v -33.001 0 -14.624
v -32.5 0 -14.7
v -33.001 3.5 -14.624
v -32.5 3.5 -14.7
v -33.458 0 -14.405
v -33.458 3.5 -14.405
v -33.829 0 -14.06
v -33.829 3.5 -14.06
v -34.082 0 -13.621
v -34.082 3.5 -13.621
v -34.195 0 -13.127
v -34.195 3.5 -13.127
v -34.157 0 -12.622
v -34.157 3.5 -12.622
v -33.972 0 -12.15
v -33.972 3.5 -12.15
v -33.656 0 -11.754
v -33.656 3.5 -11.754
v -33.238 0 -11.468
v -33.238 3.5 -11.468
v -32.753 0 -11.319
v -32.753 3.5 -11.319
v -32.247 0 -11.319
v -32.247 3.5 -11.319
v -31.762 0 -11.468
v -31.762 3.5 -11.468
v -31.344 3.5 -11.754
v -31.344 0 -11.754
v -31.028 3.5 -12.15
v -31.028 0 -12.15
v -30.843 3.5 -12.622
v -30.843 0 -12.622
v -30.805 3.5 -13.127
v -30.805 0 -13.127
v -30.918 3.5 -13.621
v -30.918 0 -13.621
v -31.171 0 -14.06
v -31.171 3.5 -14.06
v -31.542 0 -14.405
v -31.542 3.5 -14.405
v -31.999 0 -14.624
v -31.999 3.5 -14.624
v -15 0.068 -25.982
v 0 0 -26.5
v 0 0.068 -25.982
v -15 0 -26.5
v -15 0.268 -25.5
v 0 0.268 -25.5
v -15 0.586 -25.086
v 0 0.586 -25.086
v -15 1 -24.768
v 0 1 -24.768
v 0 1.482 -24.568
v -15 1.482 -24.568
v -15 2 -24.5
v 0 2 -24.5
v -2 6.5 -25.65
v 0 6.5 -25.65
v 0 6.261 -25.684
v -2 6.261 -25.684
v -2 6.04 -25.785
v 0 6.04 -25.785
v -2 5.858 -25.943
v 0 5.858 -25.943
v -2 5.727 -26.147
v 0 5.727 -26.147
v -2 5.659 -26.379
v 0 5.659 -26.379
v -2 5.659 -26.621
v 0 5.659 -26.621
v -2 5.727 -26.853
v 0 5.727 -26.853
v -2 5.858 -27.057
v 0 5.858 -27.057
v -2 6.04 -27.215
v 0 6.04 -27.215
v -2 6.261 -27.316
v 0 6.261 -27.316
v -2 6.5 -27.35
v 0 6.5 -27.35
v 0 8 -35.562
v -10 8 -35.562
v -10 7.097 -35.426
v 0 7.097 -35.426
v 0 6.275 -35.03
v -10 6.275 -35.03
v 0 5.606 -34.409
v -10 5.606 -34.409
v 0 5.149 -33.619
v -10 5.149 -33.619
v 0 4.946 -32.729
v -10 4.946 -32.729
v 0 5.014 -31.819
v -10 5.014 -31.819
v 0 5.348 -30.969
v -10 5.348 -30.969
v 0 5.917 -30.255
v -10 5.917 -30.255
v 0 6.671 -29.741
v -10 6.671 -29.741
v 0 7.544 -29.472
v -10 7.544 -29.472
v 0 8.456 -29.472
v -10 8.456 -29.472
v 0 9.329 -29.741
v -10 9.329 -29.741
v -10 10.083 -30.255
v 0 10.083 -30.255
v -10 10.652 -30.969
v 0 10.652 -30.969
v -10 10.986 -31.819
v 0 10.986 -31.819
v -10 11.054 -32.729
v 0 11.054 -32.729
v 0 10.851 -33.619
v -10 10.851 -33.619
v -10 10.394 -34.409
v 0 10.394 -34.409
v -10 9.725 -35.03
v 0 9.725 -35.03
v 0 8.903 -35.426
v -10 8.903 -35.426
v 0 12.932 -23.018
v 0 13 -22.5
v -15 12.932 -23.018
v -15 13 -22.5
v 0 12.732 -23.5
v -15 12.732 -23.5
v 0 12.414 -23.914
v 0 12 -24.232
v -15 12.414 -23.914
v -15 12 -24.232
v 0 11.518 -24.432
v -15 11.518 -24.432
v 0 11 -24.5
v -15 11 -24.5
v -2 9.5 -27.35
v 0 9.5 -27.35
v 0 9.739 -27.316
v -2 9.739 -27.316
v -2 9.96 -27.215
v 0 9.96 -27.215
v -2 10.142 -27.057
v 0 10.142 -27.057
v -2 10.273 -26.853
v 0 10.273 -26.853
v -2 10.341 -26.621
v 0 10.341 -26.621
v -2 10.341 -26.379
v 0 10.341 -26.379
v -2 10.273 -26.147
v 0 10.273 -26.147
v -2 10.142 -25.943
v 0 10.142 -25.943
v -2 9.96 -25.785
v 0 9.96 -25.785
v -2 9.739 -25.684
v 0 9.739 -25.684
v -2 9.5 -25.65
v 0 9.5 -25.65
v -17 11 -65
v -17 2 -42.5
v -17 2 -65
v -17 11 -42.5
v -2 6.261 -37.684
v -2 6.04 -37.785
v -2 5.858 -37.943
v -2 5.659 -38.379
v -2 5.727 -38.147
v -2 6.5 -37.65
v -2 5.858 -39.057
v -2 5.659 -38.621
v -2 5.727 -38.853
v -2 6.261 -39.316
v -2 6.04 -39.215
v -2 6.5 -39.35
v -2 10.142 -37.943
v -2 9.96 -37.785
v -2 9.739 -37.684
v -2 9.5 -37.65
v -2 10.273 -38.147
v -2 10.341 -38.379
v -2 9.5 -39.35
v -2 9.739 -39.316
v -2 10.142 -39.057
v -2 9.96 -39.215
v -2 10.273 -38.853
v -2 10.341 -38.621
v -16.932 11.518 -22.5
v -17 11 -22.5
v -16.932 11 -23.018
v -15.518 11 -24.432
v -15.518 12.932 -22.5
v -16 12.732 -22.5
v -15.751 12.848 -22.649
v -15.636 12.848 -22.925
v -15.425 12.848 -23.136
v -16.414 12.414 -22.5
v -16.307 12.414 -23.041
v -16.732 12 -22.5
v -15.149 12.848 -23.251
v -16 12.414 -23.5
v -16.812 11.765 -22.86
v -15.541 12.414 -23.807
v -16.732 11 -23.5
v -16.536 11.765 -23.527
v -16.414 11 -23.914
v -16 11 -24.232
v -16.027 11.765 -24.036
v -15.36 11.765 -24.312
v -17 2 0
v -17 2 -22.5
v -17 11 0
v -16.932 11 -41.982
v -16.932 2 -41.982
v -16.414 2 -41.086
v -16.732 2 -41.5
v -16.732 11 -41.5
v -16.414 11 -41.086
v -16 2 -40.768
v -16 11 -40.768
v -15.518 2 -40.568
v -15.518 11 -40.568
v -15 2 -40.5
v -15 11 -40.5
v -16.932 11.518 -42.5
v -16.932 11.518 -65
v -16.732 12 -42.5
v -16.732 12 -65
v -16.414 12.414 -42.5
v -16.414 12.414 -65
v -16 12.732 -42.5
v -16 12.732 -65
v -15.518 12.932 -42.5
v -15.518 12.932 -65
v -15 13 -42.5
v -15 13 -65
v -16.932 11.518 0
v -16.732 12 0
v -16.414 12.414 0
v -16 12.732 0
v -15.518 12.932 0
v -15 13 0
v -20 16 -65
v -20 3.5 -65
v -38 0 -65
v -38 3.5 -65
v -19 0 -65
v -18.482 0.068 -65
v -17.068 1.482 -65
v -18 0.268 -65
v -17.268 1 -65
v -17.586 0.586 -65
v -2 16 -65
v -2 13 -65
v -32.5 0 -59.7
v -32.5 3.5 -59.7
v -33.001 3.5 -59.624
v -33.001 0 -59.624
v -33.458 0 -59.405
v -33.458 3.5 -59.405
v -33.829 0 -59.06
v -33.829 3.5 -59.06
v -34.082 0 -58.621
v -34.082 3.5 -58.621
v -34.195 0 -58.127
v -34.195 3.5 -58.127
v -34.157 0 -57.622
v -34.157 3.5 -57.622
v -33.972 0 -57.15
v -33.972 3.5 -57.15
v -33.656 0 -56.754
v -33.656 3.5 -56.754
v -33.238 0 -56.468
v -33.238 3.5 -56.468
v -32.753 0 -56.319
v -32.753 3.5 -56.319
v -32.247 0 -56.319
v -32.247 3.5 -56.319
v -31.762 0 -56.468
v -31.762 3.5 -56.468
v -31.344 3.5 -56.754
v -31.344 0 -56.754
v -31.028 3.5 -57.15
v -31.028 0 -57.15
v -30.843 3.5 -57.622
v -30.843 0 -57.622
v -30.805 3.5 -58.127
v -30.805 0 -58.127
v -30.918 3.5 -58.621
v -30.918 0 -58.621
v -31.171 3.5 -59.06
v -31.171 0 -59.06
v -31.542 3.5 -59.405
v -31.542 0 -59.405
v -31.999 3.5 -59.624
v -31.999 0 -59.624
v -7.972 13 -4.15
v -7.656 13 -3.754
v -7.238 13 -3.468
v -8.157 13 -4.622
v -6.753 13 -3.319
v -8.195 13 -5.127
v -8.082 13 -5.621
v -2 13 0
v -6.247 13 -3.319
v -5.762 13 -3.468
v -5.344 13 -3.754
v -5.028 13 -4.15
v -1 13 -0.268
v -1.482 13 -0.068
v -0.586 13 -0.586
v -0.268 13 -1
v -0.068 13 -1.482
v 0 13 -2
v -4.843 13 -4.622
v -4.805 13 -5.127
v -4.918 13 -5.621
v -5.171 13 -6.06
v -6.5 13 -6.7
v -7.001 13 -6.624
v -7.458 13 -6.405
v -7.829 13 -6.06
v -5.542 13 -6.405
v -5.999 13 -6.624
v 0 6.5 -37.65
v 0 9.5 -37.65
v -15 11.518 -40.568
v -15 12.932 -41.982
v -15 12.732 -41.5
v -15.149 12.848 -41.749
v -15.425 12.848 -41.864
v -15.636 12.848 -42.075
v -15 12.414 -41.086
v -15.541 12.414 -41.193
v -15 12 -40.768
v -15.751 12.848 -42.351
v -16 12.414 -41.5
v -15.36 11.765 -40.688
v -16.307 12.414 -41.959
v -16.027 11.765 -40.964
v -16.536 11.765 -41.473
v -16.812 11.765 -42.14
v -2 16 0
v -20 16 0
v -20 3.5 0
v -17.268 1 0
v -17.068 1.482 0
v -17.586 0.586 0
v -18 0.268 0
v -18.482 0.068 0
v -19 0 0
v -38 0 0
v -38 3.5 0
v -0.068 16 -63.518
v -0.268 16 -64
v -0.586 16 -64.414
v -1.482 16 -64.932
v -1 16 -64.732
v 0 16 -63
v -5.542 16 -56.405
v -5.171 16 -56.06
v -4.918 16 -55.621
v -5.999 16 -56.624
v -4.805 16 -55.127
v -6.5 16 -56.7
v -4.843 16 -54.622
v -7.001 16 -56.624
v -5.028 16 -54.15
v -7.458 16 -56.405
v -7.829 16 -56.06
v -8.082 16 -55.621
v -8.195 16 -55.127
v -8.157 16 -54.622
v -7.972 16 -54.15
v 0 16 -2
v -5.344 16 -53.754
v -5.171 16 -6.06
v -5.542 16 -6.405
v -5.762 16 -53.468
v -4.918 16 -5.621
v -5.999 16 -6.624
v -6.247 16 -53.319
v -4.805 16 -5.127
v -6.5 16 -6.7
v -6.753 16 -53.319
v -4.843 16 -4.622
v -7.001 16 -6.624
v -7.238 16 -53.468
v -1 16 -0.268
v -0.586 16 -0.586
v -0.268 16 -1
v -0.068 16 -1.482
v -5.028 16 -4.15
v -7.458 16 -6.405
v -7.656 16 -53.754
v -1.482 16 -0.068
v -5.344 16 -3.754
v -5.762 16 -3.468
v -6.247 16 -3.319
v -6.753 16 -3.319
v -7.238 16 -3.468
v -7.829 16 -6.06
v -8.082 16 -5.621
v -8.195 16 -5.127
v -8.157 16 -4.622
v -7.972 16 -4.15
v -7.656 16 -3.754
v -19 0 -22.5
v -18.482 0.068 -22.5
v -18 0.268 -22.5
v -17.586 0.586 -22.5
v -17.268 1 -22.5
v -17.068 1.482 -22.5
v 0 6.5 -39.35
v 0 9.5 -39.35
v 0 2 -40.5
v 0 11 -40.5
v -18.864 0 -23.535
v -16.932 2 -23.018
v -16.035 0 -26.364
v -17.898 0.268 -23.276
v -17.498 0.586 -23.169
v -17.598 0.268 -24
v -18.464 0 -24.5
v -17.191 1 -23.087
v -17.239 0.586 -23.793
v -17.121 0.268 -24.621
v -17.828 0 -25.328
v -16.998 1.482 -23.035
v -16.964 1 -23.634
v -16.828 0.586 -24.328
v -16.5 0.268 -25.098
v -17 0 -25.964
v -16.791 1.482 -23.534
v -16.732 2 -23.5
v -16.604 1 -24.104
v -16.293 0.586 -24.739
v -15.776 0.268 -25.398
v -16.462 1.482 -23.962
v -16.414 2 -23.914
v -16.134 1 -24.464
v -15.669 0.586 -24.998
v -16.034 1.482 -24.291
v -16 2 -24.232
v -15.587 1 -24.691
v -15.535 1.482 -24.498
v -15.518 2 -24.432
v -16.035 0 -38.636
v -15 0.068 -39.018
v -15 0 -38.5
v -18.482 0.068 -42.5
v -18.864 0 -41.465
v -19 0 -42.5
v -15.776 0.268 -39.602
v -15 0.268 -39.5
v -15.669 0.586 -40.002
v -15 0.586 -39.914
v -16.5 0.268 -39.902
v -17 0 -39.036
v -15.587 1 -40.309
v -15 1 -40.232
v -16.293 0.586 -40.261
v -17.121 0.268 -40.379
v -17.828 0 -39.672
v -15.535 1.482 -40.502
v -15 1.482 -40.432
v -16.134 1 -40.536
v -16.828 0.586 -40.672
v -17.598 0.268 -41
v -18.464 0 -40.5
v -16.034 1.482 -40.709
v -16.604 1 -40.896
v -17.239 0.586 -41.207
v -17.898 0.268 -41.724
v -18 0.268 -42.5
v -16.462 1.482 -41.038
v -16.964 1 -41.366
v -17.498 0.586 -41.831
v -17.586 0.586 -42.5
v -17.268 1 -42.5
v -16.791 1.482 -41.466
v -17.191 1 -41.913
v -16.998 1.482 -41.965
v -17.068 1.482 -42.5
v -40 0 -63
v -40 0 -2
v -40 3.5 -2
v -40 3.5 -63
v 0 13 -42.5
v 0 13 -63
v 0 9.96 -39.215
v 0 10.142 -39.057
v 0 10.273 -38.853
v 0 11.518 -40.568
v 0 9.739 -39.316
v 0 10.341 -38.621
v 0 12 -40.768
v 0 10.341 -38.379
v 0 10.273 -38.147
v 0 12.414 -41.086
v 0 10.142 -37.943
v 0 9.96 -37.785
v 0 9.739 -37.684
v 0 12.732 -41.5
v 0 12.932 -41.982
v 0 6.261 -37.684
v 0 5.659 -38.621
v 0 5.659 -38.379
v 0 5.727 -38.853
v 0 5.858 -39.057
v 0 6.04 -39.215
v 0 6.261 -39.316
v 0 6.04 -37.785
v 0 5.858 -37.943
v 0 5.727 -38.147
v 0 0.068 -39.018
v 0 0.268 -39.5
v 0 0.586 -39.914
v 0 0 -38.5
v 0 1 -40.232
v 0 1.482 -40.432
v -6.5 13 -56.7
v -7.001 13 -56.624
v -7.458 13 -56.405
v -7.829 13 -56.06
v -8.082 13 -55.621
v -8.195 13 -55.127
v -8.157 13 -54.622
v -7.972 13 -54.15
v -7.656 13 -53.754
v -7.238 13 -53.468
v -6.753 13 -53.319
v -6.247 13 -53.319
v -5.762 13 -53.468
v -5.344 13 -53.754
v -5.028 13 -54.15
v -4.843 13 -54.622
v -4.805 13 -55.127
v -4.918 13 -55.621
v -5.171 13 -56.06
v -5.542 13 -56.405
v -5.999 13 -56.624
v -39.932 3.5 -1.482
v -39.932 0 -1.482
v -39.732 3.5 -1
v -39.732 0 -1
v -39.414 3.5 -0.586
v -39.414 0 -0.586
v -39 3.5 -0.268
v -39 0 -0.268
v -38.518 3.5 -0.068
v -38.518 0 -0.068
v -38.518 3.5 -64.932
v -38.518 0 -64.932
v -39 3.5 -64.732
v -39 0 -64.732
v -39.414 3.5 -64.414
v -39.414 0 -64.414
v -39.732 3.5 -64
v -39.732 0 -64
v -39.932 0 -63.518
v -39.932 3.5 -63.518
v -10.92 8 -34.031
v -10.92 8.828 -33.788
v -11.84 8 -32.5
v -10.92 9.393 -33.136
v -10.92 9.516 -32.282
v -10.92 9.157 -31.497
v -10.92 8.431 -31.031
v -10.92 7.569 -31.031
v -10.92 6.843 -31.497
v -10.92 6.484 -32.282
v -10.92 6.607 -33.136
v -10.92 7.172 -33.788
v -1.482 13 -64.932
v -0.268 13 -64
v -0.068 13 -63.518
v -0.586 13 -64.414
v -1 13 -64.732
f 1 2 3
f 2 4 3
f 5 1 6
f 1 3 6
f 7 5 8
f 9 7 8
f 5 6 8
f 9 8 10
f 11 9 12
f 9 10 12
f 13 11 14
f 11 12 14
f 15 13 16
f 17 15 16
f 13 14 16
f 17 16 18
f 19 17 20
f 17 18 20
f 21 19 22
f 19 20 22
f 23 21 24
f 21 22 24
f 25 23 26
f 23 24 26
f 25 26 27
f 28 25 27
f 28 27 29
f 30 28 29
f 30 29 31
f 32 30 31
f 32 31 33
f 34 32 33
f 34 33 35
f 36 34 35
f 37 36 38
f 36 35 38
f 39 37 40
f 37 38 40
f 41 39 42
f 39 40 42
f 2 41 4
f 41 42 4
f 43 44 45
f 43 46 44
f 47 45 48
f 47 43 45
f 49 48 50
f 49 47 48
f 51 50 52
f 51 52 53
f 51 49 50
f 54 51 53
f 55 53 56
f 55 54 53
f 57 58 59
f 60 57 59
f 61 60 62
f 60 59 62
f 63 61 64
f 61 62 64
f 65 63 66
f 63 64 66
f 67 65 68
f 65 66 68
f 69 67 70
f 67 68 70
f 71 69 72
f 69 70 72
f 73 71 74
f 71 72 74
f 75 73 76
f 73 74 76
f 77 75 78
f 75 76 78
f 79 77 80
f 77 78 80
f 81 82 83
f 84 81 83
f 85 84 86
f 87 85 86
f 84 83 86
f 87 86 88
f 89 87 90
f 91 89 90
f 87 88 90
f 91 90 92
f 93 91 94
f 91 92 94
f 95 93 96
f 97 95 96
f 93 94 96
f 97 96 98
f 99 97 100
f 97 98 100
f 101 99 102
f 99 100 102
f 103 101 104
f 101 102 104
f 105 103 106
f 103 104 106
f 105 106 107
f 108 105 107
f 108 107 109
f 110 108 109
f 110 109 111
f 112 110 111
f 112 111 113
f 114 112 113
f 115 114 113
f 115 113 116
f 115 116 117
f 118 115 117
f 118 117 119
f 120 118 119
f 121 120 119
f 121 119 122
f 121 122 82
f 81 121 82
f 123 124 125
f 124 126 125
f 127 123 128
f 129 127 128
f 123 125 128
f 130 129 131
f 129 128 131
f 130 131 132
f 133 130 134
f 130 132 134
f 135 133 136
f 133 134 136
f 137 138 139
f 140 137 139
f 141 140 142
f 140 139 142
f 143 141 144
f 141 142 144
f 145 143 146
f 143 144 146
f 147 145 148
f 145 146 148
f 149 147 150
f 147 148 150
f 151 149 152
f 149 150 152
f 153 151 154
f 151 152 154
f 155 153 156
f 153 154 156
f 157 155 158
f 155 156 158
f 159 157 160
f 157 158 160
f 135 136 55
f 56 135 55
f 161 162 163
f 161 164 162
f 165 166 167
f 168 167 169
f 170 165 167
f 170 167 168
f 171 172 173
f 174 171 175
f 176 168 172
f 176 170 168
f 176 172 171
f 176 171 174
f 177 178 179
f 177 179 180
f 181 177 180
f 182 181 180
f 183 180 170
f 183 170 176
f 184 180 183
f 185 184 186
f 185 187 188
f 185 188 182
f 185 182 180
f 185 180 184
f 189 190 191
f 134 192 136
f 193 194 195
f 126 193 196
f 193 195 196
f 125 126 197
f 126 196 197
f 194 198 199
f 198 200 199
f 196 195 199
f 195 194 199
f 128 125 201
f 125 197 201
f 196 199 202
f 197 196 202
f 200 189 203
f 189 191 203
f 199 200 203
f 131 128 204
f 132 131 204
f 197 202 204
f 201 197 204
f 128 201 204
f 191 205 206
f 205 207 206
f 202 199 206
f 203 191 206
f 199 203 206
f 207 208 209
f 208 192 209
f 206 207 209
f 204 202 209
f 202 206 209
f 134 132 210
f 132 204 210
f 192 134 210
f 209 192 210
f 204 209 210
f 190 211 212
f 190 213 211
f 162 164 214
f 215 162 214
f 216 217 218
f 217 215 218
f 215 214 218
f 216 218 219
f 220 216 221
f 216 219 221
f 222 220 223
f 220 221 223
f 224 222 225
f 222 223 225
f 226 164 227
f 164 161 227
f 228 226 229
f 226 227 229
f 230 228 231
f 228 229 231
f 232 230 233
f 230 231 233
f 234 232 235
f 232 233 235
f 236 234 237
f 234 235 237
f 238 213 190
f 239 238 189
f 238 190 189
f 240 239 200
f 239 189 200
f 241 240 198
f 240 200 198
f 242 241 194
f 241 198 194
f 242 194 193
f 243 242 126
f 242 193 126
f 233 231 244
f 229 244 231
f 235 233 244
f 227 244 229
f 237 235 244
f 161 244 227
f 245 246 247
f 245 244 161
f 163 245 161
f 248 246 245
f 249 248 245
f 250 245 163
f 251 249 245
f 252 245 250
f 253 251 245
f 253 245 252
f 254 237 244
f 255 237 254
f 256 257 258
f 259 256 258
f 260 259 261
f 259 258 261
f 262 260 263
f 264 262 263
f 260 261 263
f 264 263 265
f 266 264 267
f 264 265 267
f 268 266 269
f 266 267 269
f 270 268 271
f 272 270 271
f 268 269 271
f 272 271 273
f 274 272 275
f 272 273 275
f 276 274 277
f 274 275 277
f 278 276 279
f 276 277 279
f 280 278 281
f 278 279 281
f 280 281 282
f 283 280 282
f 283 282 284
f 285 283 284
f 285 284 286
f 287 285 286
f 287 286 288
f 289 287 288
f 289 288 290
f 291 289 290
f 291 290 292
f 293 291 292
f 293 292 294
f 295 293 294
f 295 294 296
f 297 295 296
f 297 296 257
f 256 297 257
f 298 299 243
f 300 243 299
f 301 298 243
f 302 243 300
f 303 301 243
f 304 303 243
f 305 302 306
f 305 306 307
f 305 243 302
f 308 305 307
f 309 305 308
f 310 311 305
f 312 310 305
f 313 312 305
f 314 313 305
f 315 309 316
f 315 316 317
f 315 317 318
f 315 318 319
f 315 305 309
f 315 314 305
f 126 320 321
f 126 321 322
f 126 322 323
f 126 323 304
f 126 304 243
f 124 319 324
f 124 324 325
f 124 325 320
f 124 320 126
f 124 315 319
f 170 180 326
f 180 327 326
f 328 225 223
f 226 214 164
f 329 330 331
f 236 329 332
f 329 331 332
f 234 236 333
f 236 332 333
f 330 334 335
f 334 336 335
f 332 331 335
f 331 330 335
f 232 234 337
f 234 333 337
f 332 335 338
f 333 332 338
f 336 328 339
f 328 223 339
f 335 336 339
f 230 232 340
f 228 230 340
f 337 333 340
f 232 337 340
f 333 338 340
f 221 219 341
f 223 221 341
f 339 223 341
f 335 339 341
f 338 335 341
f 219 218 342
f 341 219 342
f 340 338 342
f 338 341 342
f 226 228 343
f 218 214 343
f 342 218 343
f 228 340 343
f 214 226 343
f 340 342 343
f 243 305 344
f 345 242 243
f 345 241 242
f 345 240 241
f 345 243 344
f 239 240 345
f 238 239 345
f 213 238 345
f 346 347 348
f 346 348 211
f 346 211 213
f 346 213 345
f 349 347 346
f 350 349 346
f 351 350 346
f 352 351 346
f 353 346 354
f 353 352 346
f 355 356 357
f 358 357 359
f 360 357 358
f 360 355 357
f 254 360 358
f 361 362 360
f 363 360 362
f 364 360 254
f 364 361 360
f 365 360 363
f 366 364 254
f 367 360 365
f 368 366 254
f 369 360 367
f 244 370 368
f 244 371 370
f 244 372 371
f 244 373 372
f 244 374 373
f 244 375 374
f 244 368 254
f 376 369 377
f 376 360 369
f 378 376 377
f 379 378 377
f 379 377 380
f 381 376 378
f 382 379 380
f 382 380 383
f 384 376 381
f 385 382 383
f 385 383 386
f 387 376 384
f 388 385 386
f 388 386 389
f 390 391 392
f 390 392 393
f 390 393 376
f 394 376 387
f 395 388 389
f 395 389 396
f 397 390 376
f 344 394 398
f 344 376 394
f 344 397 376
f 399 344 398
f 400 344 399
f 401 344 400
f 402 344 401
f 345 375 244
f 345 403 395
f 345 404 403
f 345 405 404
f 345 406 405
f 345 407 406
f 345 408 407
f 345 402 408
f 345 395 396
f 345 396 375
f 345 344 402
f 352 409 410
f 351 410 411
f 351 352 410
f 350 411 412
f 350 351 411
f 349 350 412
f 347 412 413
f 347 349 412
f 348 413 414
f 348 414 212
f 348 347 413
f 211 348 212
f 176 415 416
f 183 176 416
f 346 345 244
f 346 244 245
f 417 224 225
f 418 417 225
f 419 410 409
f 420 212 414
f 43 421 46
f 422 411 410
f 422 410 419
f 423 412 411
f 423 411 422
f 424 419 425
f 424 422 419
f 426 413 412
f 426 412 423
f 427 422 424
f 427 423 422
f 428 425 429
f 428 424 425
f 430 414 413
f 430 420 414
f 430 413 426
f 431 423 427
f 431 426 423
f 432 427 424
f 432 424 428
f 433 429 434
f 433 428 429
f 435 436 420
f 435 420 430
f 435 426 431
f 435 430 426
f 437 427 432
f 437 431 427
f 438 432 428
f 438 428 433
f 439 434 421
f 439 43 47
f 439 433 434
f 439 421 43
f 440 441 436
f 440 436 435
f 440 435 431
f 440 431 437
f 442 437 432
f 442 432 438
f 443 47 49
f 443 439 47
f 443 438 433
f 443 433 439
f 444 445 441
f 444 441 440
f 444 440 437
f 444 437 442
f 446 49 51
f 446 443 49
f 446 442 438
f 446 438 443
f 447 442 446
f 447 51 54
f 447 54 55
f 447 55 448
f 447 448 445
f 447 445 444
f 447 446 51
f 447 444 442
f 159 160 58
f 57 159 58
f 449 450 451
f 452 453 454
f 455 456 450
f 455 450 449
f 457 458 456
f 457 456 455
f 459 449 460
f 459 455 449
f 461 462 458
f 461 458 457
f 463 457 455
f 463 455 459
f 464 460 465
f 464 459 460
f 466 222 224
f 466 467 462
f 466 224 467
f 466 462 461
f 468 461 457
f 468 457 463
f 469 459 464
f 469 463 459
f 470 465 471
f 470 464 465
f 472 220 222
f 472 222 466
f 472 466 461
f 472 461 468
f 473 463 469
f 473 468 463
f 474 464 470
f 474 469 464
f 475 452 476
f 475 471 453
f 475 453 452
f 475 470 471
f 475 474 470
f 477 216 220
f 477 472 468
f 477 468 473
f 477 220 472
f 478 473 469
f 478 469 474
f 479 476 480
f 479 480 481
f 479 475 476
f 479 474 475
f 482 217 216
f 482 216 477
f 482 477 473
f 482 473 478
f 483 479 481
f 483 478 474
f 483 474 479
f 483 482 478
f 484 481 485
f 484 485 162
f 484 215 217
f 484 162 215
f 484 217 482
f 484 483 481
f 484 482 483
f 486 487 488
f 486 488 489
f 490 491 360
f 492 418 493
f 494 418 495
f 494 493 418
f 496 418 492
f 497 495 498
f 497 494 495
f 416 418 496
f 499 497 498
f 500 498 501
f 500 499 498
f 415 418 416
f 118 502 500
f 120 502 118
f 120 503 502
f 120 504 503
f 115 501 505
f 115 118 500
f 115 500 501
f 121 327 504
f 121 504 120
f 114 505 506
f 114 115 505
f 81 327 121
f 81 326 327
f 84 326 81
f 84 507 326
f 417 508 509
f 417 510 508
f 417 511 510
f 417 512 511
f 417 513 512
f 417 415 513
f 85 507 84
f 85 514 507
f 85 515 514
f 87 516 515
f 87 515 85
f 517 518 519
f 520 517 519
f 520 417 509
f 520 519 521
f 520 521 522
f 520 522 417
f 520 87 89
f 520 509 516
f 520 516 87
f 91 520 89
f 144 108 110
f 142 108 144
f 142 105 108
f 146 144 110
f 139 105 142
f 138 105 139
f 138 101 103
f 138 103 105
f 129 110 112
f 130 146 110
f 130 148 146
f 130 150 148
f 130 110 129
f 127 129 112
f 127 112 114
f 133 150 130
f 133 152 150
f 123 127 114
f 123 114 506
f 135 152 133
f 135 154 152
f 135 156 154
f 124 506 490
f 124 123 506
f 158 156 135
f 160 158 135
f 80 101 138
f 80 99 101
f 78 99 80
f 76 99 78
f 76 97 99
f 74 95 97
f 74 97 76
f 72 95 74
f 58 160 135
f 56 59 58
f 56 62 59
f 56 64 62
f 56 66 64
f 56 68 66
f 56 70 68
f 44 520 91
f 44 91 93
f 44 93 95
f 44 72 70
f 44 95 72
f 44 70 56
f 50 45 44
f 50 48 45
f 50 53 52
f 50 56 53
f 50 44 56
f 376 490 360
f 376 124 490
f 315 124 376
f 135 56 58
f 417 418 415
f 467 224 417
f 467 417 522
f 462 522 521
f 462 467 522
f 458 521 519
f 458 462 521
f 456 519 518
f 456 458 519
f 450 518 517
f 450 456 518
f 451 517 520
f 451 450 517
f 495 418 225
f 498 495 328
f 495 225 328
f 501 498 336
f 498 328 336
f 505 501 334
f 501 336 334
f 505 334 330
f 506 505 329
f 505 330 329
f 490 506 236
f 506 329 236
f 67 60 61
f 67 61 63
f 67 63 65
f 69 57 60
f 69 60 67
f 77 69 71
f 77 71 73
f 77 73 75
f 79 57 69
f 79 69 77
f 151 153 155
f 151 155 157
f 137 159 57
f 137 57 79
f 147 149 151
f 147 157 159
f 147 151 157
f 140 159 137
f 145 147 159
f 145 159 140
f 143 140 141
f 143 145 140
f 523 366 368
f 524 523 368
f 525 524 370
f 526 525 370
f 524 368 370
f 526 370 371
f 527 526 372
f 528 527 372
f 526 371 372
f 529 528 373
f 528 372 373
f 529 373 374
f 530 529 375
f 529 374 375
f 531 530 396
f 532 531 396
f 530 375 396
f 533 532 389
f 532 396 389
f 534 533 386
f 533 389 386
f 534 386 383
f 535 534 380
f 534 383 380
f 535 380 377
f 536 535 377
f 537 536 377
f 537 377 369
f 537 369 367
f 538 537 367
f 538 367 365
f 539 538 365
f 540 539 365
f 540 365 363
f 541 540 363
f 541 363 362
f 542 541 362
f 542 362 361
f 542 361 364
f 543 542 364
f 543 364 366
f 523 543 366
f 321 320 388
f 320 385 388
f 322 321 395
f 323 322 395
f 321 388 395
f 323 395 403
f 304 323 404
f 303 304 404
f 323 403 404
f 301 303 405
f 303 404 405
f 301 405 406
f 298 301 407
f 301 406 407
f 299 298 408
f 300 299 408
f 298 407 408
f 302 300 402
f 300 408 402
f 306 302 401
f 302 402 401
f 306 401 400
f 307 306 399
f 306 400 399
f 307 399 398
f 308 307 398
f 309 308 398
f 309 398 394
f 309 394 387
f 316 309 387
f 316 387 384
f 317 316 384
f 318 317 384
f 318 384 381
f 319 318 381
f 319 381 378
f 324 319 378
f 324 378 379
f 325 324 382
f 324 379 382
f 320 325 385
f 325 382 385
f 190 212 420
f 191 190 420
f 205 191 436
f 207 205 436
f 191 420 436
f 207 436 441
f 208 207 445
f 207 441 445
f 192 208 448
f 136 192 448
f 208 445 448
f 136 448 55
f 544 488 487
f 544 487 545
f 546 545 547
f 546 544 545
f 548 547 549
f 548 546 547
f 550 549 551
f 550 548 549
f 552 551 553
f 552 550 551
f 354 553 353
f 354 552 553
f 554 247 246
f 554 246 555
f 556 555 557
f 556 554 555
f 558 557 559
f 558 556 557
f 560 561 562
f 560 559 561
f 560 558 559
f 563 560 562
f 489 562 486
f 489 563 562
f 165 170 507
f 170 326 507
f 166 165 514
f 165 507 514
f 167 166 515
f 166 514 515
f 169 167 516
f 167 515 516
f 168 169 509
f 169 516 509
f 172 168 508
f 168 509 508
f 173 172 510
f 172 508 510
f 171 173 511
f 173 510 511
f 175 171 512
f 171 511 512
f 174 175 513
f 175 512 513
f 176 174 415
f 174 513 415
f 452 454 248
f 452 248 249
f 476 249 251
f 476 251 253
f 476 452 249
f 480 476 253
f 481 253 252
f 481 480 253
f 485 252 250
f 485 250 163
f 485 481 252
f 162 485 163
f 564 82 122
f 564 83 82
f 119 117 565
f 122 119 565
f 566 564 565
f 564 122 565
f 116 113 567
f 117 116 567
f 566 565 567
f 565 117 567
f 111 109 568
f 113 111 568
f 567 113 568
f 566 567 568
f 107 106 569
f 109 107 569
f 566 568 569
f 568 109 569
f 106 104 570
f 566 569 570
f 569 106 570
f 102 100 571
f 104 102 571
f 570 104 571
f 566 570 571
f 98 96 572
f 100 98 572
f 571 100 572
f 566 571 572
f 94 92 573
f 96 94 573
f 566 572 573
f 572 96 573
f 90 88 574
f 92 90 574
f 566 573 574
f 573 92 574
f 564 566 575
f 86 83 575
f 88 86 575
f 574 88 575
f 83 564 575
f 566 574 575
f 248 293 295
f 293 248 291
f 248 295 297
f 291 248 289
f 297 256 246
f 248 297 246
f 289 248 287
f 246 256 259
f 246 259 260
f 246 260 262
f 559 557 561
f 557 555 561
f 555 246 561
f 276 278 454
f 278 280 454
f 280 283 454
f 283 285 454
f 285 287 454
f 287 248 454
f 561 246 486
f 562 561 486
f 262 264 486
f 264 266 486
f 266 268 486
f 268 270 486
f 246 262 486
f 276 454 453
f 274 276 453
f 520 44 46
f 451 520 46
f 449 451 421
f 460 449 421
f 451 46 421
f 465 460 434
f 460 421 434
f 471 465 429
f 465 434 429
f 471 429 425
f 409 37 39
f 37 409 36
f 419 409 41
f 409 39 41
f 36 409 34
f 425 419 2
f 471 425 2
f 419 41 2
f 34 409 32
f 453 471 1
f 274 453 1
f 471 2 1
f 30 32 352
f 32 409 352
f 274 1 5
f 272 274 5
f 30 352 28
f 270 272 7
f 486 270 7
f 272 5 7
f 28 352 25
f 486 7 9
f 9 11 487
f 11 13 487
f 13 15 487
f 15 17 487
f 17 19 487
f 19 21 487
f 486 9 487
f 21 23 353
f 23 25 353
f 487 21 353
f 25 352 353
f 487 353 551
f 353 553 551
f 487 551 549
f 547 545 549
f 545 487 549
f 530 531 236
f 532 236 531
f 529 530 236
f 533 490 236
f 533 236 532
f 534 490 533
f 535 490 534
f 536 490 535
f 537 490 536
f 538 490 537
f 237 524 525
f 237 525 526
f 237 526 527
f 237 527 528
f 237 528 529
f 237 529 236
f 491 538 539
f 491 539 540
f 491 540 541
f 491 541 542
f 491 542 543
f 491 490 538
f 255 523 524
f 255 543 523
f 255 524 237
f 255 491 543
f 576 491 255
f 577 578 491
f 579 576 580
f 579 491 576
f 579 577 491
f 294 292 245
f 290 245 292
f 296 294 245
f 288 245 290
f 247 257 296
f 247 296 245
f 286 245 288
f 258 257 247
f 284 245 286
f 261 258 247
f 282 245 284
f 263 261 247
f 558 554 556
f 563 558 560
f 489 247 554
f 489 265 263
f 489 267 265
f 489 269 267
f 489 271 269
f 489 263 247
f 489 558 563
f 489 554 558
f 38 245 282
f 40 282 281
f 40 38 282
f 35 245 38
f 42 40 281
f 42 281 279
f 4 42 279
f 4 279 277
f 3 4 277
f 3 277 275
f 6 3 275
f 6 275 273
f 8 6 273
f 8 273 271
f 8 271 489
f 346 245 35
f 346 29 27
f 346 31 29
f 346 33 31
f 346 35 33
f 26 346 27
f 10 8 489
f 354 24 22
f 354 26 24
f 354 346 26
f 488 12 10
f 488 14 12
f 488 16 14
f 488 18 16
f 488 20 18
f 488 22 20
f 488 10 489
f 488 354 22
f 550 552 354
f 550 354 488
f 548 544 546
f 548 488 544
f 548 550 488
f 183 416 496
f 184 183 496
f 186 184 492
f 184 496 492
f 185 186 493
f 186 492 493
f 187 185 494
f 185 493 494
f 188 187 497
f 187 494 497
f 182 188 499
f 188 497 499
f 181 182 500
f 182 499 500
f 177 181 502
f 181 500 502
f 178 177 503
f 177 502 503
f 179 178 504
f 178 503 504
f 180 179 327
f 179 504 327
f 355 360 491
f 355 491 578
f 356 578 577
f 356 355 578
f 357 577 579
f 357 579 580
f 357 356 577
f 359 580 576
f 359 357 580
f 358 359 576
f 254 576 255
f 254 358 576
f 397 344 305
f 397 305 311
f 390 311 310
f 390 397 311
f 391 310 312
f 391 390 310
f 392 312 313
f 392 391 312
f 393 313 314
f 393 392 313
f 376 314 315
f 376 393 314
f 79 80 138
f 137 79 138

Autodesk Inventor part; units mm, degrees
ref_plane "YZ Plane" through (0, 0, 0) normal (1, 0, 0) x (0, 1, 0)
ref_plane "XZ Plane" through (0, 0, 0) normal (0, 1, 0) x (-1, 0, 0)
ref_plane "XY Plane" through (0, 0, 0) normal (0, 0, 1) x (1, 0, 0)
sketch "Sketch1" plane through (0, 0, 0) normal (0, 1, 0) x (-1, 0, 0)
  line L0 (0, 0) -> (40, 0)
  line L1 (40, 0) -> (40, -65)
  line L2 (40, -65) -> (0, -65)
  line L3 (0, -65) -> (0, 0)
  dimension "d0" = 40
  dimension "d1" = 65
extrude "Extrusion1" add sketch "Sketch1" along normal blind 16
sketch "Sketch2" plane through (-40, 0, 0) normal (0, 0, 1) x (1, 0, 0)
  line L0 (0, 16) -> (40, 16) projected
  line L1 (0, 16) -> (20, 16)
  line L2 (20, 16) -> (20, 3.5)
  line L3 (20, 3.5) -> (0, 3.5)
  line L4 (0, 3.5) -> (0, 16)
  line L5 (40, 0) -> (0, 0) projected
  dimension "d4" = 20
  dimension "d5" = 3.5
extrude "Extrusion2" cut sketch "Sketch2" against normal through all
sketch "Sketch3" plane through (0, 0, 0) normal (0, -1, 0) x (1, 0, 0)
  line L0 (-32.5, -58) -> (-32.5, -13) construction
  line L1 (-6.5, -55) -> (-6.5, -5) construction
  line L2 (-40, -65) -> (0, -65) construction
  line L3 (0, 0) -> (-40, 0) construction
  line L4 (0, -65) -> (0, 0) construction
  line L5 (-40, 0) -> (-40, -65) construction
  dimension "d8" = 45
  dimension "d9" = 50
  dimension "d10" = 7
  dimension "d11" = 5
  dimension "d12" = 6.5
  dimension "d13" = 7.5
hole "Hole1" at (-32.5, 0, -58) at (-32.5, 0, -13) at (-6.5, 0, -55) at (-6.5, 0, -5) direction (0, 1, 0) diameter 3.4 end through all clearance for "Flat Head Machine Screw" size "M3" standard "Ansi Metric M Profile"
sketch "Sketch4" plane through (0, 0, 0) normal (1, 0, 0) x (0, 0, -1)
  line L0 (38.5, 6.5) -> (38.5, 9.5) construction
  line L1 (39.35, 6.5) -> (39.35, 9.5)
  line L2 (37.65, 9.5) -> (37.65, 6.5)
  arc A0 (37.65, 6.5) -> (39.35, 6.5) centre (38.5, 6.5) ccw
  arc A1 (39.35, 9.5) -> (37.65, 9.5) centre (38.5, 9.5) ccw
  line L3 (26.5, 6.5) -> (26.5, 9.5) construction
  line L4 (27.35, 6.5) -> (27.35, 9.5)
  line L5 (25.65, 9.5) -> (25.65, 6.5)
  arc A2 (25.65, 6.5) -> (27.35, 6.5) centre (26.5, 6.5) ccw
  arc A3 (27.35, 9.5) -> (25.65, 9.5) centre (26.5, 9.5) ccw
  line L6 (0, 0) -> (0, 16) construction
  line L7 (65, 0) -> (65, 16) construction
  line L8 (38.5, 8) -> (26.5, 8) construction
  line L9 (65, 0) -> (0, 0) construction
  line L10 (0, 16) -> (65, 16) construction
  line L11 (65, 0) -> (40.5, 0)
  line L12 (40.5, 0) -> (40.5, 13)
  line L13 (40.5, 13) -> (65, 13)
  line L14 (65, 13) -> (65, 0)
  line L15 (24.5, 0) -> (0, 0)
  line L16 (0, 0) -> (0, 13)
  line L17 (0, 13) -> (24.5, 13)
  line L18 (24.5, 13) -> (24.5, 0)
  point P0 (32.5, 8)
  dimension "d21" = 12
  dimension "d22" = 6
  dimension "d23" = 65
  dimension "d24" = 32.5
  dimension "d25" = 3
  dimension "d26" = 3
  dimension "d27" = 0.85
  dimension "d28" = 0.85
  dimension "d29" = 0
  dimension "d30" = 16
  dimension "d31" = 8
  dimension "d32" = 3
  dimension "d33" = 3
  dimension "d34" = 16
  dimension "d35" = 8
extrude "Extrusion3" cut sketch "Sketch4" against normal blind 2 contours A0 L2 A1 L1 | A2 L5 A3 L4
extrude "Extrusion4" cut sketch "Sketch4" against normal blind 17 contours L11 L12 L13 L14 | L15 L16 L17 L18
fillet "Fillet1" radius 2 14 edges at (-8.5, 0, -40.5) (-8.5, 0, -24.5) (-40, 1.75, -65) (-40, 1.75, 0) (0, 14.5, 0) (0, 14.5, -65) (-17, 0, -52.75) (-17, 0, -12.25) (-17, 6.5, -40.5) (-17, 6.5, -24.5) (-17, 13, -52.75) (-8.5, 13, -40.5) (-17, 13, -12.25) (-8.5, 13, -24.5)
hole "Hole2" at (0, 8, -32.5) direction (-1, 0, 0) diameter 6.125 depth 10 tip angle 118
equation "\"d22\" = 0.5 * d21"
equation "\"d24\" = 0.5 * d23"
equation "\"d26\" = d25"
equation "\"d28\" = d27"
equation "\"d31\" = 0.5 * d30"
equation "\"d35\" = 0.5 * d34"
properties part number "Dual Camera Mount"
